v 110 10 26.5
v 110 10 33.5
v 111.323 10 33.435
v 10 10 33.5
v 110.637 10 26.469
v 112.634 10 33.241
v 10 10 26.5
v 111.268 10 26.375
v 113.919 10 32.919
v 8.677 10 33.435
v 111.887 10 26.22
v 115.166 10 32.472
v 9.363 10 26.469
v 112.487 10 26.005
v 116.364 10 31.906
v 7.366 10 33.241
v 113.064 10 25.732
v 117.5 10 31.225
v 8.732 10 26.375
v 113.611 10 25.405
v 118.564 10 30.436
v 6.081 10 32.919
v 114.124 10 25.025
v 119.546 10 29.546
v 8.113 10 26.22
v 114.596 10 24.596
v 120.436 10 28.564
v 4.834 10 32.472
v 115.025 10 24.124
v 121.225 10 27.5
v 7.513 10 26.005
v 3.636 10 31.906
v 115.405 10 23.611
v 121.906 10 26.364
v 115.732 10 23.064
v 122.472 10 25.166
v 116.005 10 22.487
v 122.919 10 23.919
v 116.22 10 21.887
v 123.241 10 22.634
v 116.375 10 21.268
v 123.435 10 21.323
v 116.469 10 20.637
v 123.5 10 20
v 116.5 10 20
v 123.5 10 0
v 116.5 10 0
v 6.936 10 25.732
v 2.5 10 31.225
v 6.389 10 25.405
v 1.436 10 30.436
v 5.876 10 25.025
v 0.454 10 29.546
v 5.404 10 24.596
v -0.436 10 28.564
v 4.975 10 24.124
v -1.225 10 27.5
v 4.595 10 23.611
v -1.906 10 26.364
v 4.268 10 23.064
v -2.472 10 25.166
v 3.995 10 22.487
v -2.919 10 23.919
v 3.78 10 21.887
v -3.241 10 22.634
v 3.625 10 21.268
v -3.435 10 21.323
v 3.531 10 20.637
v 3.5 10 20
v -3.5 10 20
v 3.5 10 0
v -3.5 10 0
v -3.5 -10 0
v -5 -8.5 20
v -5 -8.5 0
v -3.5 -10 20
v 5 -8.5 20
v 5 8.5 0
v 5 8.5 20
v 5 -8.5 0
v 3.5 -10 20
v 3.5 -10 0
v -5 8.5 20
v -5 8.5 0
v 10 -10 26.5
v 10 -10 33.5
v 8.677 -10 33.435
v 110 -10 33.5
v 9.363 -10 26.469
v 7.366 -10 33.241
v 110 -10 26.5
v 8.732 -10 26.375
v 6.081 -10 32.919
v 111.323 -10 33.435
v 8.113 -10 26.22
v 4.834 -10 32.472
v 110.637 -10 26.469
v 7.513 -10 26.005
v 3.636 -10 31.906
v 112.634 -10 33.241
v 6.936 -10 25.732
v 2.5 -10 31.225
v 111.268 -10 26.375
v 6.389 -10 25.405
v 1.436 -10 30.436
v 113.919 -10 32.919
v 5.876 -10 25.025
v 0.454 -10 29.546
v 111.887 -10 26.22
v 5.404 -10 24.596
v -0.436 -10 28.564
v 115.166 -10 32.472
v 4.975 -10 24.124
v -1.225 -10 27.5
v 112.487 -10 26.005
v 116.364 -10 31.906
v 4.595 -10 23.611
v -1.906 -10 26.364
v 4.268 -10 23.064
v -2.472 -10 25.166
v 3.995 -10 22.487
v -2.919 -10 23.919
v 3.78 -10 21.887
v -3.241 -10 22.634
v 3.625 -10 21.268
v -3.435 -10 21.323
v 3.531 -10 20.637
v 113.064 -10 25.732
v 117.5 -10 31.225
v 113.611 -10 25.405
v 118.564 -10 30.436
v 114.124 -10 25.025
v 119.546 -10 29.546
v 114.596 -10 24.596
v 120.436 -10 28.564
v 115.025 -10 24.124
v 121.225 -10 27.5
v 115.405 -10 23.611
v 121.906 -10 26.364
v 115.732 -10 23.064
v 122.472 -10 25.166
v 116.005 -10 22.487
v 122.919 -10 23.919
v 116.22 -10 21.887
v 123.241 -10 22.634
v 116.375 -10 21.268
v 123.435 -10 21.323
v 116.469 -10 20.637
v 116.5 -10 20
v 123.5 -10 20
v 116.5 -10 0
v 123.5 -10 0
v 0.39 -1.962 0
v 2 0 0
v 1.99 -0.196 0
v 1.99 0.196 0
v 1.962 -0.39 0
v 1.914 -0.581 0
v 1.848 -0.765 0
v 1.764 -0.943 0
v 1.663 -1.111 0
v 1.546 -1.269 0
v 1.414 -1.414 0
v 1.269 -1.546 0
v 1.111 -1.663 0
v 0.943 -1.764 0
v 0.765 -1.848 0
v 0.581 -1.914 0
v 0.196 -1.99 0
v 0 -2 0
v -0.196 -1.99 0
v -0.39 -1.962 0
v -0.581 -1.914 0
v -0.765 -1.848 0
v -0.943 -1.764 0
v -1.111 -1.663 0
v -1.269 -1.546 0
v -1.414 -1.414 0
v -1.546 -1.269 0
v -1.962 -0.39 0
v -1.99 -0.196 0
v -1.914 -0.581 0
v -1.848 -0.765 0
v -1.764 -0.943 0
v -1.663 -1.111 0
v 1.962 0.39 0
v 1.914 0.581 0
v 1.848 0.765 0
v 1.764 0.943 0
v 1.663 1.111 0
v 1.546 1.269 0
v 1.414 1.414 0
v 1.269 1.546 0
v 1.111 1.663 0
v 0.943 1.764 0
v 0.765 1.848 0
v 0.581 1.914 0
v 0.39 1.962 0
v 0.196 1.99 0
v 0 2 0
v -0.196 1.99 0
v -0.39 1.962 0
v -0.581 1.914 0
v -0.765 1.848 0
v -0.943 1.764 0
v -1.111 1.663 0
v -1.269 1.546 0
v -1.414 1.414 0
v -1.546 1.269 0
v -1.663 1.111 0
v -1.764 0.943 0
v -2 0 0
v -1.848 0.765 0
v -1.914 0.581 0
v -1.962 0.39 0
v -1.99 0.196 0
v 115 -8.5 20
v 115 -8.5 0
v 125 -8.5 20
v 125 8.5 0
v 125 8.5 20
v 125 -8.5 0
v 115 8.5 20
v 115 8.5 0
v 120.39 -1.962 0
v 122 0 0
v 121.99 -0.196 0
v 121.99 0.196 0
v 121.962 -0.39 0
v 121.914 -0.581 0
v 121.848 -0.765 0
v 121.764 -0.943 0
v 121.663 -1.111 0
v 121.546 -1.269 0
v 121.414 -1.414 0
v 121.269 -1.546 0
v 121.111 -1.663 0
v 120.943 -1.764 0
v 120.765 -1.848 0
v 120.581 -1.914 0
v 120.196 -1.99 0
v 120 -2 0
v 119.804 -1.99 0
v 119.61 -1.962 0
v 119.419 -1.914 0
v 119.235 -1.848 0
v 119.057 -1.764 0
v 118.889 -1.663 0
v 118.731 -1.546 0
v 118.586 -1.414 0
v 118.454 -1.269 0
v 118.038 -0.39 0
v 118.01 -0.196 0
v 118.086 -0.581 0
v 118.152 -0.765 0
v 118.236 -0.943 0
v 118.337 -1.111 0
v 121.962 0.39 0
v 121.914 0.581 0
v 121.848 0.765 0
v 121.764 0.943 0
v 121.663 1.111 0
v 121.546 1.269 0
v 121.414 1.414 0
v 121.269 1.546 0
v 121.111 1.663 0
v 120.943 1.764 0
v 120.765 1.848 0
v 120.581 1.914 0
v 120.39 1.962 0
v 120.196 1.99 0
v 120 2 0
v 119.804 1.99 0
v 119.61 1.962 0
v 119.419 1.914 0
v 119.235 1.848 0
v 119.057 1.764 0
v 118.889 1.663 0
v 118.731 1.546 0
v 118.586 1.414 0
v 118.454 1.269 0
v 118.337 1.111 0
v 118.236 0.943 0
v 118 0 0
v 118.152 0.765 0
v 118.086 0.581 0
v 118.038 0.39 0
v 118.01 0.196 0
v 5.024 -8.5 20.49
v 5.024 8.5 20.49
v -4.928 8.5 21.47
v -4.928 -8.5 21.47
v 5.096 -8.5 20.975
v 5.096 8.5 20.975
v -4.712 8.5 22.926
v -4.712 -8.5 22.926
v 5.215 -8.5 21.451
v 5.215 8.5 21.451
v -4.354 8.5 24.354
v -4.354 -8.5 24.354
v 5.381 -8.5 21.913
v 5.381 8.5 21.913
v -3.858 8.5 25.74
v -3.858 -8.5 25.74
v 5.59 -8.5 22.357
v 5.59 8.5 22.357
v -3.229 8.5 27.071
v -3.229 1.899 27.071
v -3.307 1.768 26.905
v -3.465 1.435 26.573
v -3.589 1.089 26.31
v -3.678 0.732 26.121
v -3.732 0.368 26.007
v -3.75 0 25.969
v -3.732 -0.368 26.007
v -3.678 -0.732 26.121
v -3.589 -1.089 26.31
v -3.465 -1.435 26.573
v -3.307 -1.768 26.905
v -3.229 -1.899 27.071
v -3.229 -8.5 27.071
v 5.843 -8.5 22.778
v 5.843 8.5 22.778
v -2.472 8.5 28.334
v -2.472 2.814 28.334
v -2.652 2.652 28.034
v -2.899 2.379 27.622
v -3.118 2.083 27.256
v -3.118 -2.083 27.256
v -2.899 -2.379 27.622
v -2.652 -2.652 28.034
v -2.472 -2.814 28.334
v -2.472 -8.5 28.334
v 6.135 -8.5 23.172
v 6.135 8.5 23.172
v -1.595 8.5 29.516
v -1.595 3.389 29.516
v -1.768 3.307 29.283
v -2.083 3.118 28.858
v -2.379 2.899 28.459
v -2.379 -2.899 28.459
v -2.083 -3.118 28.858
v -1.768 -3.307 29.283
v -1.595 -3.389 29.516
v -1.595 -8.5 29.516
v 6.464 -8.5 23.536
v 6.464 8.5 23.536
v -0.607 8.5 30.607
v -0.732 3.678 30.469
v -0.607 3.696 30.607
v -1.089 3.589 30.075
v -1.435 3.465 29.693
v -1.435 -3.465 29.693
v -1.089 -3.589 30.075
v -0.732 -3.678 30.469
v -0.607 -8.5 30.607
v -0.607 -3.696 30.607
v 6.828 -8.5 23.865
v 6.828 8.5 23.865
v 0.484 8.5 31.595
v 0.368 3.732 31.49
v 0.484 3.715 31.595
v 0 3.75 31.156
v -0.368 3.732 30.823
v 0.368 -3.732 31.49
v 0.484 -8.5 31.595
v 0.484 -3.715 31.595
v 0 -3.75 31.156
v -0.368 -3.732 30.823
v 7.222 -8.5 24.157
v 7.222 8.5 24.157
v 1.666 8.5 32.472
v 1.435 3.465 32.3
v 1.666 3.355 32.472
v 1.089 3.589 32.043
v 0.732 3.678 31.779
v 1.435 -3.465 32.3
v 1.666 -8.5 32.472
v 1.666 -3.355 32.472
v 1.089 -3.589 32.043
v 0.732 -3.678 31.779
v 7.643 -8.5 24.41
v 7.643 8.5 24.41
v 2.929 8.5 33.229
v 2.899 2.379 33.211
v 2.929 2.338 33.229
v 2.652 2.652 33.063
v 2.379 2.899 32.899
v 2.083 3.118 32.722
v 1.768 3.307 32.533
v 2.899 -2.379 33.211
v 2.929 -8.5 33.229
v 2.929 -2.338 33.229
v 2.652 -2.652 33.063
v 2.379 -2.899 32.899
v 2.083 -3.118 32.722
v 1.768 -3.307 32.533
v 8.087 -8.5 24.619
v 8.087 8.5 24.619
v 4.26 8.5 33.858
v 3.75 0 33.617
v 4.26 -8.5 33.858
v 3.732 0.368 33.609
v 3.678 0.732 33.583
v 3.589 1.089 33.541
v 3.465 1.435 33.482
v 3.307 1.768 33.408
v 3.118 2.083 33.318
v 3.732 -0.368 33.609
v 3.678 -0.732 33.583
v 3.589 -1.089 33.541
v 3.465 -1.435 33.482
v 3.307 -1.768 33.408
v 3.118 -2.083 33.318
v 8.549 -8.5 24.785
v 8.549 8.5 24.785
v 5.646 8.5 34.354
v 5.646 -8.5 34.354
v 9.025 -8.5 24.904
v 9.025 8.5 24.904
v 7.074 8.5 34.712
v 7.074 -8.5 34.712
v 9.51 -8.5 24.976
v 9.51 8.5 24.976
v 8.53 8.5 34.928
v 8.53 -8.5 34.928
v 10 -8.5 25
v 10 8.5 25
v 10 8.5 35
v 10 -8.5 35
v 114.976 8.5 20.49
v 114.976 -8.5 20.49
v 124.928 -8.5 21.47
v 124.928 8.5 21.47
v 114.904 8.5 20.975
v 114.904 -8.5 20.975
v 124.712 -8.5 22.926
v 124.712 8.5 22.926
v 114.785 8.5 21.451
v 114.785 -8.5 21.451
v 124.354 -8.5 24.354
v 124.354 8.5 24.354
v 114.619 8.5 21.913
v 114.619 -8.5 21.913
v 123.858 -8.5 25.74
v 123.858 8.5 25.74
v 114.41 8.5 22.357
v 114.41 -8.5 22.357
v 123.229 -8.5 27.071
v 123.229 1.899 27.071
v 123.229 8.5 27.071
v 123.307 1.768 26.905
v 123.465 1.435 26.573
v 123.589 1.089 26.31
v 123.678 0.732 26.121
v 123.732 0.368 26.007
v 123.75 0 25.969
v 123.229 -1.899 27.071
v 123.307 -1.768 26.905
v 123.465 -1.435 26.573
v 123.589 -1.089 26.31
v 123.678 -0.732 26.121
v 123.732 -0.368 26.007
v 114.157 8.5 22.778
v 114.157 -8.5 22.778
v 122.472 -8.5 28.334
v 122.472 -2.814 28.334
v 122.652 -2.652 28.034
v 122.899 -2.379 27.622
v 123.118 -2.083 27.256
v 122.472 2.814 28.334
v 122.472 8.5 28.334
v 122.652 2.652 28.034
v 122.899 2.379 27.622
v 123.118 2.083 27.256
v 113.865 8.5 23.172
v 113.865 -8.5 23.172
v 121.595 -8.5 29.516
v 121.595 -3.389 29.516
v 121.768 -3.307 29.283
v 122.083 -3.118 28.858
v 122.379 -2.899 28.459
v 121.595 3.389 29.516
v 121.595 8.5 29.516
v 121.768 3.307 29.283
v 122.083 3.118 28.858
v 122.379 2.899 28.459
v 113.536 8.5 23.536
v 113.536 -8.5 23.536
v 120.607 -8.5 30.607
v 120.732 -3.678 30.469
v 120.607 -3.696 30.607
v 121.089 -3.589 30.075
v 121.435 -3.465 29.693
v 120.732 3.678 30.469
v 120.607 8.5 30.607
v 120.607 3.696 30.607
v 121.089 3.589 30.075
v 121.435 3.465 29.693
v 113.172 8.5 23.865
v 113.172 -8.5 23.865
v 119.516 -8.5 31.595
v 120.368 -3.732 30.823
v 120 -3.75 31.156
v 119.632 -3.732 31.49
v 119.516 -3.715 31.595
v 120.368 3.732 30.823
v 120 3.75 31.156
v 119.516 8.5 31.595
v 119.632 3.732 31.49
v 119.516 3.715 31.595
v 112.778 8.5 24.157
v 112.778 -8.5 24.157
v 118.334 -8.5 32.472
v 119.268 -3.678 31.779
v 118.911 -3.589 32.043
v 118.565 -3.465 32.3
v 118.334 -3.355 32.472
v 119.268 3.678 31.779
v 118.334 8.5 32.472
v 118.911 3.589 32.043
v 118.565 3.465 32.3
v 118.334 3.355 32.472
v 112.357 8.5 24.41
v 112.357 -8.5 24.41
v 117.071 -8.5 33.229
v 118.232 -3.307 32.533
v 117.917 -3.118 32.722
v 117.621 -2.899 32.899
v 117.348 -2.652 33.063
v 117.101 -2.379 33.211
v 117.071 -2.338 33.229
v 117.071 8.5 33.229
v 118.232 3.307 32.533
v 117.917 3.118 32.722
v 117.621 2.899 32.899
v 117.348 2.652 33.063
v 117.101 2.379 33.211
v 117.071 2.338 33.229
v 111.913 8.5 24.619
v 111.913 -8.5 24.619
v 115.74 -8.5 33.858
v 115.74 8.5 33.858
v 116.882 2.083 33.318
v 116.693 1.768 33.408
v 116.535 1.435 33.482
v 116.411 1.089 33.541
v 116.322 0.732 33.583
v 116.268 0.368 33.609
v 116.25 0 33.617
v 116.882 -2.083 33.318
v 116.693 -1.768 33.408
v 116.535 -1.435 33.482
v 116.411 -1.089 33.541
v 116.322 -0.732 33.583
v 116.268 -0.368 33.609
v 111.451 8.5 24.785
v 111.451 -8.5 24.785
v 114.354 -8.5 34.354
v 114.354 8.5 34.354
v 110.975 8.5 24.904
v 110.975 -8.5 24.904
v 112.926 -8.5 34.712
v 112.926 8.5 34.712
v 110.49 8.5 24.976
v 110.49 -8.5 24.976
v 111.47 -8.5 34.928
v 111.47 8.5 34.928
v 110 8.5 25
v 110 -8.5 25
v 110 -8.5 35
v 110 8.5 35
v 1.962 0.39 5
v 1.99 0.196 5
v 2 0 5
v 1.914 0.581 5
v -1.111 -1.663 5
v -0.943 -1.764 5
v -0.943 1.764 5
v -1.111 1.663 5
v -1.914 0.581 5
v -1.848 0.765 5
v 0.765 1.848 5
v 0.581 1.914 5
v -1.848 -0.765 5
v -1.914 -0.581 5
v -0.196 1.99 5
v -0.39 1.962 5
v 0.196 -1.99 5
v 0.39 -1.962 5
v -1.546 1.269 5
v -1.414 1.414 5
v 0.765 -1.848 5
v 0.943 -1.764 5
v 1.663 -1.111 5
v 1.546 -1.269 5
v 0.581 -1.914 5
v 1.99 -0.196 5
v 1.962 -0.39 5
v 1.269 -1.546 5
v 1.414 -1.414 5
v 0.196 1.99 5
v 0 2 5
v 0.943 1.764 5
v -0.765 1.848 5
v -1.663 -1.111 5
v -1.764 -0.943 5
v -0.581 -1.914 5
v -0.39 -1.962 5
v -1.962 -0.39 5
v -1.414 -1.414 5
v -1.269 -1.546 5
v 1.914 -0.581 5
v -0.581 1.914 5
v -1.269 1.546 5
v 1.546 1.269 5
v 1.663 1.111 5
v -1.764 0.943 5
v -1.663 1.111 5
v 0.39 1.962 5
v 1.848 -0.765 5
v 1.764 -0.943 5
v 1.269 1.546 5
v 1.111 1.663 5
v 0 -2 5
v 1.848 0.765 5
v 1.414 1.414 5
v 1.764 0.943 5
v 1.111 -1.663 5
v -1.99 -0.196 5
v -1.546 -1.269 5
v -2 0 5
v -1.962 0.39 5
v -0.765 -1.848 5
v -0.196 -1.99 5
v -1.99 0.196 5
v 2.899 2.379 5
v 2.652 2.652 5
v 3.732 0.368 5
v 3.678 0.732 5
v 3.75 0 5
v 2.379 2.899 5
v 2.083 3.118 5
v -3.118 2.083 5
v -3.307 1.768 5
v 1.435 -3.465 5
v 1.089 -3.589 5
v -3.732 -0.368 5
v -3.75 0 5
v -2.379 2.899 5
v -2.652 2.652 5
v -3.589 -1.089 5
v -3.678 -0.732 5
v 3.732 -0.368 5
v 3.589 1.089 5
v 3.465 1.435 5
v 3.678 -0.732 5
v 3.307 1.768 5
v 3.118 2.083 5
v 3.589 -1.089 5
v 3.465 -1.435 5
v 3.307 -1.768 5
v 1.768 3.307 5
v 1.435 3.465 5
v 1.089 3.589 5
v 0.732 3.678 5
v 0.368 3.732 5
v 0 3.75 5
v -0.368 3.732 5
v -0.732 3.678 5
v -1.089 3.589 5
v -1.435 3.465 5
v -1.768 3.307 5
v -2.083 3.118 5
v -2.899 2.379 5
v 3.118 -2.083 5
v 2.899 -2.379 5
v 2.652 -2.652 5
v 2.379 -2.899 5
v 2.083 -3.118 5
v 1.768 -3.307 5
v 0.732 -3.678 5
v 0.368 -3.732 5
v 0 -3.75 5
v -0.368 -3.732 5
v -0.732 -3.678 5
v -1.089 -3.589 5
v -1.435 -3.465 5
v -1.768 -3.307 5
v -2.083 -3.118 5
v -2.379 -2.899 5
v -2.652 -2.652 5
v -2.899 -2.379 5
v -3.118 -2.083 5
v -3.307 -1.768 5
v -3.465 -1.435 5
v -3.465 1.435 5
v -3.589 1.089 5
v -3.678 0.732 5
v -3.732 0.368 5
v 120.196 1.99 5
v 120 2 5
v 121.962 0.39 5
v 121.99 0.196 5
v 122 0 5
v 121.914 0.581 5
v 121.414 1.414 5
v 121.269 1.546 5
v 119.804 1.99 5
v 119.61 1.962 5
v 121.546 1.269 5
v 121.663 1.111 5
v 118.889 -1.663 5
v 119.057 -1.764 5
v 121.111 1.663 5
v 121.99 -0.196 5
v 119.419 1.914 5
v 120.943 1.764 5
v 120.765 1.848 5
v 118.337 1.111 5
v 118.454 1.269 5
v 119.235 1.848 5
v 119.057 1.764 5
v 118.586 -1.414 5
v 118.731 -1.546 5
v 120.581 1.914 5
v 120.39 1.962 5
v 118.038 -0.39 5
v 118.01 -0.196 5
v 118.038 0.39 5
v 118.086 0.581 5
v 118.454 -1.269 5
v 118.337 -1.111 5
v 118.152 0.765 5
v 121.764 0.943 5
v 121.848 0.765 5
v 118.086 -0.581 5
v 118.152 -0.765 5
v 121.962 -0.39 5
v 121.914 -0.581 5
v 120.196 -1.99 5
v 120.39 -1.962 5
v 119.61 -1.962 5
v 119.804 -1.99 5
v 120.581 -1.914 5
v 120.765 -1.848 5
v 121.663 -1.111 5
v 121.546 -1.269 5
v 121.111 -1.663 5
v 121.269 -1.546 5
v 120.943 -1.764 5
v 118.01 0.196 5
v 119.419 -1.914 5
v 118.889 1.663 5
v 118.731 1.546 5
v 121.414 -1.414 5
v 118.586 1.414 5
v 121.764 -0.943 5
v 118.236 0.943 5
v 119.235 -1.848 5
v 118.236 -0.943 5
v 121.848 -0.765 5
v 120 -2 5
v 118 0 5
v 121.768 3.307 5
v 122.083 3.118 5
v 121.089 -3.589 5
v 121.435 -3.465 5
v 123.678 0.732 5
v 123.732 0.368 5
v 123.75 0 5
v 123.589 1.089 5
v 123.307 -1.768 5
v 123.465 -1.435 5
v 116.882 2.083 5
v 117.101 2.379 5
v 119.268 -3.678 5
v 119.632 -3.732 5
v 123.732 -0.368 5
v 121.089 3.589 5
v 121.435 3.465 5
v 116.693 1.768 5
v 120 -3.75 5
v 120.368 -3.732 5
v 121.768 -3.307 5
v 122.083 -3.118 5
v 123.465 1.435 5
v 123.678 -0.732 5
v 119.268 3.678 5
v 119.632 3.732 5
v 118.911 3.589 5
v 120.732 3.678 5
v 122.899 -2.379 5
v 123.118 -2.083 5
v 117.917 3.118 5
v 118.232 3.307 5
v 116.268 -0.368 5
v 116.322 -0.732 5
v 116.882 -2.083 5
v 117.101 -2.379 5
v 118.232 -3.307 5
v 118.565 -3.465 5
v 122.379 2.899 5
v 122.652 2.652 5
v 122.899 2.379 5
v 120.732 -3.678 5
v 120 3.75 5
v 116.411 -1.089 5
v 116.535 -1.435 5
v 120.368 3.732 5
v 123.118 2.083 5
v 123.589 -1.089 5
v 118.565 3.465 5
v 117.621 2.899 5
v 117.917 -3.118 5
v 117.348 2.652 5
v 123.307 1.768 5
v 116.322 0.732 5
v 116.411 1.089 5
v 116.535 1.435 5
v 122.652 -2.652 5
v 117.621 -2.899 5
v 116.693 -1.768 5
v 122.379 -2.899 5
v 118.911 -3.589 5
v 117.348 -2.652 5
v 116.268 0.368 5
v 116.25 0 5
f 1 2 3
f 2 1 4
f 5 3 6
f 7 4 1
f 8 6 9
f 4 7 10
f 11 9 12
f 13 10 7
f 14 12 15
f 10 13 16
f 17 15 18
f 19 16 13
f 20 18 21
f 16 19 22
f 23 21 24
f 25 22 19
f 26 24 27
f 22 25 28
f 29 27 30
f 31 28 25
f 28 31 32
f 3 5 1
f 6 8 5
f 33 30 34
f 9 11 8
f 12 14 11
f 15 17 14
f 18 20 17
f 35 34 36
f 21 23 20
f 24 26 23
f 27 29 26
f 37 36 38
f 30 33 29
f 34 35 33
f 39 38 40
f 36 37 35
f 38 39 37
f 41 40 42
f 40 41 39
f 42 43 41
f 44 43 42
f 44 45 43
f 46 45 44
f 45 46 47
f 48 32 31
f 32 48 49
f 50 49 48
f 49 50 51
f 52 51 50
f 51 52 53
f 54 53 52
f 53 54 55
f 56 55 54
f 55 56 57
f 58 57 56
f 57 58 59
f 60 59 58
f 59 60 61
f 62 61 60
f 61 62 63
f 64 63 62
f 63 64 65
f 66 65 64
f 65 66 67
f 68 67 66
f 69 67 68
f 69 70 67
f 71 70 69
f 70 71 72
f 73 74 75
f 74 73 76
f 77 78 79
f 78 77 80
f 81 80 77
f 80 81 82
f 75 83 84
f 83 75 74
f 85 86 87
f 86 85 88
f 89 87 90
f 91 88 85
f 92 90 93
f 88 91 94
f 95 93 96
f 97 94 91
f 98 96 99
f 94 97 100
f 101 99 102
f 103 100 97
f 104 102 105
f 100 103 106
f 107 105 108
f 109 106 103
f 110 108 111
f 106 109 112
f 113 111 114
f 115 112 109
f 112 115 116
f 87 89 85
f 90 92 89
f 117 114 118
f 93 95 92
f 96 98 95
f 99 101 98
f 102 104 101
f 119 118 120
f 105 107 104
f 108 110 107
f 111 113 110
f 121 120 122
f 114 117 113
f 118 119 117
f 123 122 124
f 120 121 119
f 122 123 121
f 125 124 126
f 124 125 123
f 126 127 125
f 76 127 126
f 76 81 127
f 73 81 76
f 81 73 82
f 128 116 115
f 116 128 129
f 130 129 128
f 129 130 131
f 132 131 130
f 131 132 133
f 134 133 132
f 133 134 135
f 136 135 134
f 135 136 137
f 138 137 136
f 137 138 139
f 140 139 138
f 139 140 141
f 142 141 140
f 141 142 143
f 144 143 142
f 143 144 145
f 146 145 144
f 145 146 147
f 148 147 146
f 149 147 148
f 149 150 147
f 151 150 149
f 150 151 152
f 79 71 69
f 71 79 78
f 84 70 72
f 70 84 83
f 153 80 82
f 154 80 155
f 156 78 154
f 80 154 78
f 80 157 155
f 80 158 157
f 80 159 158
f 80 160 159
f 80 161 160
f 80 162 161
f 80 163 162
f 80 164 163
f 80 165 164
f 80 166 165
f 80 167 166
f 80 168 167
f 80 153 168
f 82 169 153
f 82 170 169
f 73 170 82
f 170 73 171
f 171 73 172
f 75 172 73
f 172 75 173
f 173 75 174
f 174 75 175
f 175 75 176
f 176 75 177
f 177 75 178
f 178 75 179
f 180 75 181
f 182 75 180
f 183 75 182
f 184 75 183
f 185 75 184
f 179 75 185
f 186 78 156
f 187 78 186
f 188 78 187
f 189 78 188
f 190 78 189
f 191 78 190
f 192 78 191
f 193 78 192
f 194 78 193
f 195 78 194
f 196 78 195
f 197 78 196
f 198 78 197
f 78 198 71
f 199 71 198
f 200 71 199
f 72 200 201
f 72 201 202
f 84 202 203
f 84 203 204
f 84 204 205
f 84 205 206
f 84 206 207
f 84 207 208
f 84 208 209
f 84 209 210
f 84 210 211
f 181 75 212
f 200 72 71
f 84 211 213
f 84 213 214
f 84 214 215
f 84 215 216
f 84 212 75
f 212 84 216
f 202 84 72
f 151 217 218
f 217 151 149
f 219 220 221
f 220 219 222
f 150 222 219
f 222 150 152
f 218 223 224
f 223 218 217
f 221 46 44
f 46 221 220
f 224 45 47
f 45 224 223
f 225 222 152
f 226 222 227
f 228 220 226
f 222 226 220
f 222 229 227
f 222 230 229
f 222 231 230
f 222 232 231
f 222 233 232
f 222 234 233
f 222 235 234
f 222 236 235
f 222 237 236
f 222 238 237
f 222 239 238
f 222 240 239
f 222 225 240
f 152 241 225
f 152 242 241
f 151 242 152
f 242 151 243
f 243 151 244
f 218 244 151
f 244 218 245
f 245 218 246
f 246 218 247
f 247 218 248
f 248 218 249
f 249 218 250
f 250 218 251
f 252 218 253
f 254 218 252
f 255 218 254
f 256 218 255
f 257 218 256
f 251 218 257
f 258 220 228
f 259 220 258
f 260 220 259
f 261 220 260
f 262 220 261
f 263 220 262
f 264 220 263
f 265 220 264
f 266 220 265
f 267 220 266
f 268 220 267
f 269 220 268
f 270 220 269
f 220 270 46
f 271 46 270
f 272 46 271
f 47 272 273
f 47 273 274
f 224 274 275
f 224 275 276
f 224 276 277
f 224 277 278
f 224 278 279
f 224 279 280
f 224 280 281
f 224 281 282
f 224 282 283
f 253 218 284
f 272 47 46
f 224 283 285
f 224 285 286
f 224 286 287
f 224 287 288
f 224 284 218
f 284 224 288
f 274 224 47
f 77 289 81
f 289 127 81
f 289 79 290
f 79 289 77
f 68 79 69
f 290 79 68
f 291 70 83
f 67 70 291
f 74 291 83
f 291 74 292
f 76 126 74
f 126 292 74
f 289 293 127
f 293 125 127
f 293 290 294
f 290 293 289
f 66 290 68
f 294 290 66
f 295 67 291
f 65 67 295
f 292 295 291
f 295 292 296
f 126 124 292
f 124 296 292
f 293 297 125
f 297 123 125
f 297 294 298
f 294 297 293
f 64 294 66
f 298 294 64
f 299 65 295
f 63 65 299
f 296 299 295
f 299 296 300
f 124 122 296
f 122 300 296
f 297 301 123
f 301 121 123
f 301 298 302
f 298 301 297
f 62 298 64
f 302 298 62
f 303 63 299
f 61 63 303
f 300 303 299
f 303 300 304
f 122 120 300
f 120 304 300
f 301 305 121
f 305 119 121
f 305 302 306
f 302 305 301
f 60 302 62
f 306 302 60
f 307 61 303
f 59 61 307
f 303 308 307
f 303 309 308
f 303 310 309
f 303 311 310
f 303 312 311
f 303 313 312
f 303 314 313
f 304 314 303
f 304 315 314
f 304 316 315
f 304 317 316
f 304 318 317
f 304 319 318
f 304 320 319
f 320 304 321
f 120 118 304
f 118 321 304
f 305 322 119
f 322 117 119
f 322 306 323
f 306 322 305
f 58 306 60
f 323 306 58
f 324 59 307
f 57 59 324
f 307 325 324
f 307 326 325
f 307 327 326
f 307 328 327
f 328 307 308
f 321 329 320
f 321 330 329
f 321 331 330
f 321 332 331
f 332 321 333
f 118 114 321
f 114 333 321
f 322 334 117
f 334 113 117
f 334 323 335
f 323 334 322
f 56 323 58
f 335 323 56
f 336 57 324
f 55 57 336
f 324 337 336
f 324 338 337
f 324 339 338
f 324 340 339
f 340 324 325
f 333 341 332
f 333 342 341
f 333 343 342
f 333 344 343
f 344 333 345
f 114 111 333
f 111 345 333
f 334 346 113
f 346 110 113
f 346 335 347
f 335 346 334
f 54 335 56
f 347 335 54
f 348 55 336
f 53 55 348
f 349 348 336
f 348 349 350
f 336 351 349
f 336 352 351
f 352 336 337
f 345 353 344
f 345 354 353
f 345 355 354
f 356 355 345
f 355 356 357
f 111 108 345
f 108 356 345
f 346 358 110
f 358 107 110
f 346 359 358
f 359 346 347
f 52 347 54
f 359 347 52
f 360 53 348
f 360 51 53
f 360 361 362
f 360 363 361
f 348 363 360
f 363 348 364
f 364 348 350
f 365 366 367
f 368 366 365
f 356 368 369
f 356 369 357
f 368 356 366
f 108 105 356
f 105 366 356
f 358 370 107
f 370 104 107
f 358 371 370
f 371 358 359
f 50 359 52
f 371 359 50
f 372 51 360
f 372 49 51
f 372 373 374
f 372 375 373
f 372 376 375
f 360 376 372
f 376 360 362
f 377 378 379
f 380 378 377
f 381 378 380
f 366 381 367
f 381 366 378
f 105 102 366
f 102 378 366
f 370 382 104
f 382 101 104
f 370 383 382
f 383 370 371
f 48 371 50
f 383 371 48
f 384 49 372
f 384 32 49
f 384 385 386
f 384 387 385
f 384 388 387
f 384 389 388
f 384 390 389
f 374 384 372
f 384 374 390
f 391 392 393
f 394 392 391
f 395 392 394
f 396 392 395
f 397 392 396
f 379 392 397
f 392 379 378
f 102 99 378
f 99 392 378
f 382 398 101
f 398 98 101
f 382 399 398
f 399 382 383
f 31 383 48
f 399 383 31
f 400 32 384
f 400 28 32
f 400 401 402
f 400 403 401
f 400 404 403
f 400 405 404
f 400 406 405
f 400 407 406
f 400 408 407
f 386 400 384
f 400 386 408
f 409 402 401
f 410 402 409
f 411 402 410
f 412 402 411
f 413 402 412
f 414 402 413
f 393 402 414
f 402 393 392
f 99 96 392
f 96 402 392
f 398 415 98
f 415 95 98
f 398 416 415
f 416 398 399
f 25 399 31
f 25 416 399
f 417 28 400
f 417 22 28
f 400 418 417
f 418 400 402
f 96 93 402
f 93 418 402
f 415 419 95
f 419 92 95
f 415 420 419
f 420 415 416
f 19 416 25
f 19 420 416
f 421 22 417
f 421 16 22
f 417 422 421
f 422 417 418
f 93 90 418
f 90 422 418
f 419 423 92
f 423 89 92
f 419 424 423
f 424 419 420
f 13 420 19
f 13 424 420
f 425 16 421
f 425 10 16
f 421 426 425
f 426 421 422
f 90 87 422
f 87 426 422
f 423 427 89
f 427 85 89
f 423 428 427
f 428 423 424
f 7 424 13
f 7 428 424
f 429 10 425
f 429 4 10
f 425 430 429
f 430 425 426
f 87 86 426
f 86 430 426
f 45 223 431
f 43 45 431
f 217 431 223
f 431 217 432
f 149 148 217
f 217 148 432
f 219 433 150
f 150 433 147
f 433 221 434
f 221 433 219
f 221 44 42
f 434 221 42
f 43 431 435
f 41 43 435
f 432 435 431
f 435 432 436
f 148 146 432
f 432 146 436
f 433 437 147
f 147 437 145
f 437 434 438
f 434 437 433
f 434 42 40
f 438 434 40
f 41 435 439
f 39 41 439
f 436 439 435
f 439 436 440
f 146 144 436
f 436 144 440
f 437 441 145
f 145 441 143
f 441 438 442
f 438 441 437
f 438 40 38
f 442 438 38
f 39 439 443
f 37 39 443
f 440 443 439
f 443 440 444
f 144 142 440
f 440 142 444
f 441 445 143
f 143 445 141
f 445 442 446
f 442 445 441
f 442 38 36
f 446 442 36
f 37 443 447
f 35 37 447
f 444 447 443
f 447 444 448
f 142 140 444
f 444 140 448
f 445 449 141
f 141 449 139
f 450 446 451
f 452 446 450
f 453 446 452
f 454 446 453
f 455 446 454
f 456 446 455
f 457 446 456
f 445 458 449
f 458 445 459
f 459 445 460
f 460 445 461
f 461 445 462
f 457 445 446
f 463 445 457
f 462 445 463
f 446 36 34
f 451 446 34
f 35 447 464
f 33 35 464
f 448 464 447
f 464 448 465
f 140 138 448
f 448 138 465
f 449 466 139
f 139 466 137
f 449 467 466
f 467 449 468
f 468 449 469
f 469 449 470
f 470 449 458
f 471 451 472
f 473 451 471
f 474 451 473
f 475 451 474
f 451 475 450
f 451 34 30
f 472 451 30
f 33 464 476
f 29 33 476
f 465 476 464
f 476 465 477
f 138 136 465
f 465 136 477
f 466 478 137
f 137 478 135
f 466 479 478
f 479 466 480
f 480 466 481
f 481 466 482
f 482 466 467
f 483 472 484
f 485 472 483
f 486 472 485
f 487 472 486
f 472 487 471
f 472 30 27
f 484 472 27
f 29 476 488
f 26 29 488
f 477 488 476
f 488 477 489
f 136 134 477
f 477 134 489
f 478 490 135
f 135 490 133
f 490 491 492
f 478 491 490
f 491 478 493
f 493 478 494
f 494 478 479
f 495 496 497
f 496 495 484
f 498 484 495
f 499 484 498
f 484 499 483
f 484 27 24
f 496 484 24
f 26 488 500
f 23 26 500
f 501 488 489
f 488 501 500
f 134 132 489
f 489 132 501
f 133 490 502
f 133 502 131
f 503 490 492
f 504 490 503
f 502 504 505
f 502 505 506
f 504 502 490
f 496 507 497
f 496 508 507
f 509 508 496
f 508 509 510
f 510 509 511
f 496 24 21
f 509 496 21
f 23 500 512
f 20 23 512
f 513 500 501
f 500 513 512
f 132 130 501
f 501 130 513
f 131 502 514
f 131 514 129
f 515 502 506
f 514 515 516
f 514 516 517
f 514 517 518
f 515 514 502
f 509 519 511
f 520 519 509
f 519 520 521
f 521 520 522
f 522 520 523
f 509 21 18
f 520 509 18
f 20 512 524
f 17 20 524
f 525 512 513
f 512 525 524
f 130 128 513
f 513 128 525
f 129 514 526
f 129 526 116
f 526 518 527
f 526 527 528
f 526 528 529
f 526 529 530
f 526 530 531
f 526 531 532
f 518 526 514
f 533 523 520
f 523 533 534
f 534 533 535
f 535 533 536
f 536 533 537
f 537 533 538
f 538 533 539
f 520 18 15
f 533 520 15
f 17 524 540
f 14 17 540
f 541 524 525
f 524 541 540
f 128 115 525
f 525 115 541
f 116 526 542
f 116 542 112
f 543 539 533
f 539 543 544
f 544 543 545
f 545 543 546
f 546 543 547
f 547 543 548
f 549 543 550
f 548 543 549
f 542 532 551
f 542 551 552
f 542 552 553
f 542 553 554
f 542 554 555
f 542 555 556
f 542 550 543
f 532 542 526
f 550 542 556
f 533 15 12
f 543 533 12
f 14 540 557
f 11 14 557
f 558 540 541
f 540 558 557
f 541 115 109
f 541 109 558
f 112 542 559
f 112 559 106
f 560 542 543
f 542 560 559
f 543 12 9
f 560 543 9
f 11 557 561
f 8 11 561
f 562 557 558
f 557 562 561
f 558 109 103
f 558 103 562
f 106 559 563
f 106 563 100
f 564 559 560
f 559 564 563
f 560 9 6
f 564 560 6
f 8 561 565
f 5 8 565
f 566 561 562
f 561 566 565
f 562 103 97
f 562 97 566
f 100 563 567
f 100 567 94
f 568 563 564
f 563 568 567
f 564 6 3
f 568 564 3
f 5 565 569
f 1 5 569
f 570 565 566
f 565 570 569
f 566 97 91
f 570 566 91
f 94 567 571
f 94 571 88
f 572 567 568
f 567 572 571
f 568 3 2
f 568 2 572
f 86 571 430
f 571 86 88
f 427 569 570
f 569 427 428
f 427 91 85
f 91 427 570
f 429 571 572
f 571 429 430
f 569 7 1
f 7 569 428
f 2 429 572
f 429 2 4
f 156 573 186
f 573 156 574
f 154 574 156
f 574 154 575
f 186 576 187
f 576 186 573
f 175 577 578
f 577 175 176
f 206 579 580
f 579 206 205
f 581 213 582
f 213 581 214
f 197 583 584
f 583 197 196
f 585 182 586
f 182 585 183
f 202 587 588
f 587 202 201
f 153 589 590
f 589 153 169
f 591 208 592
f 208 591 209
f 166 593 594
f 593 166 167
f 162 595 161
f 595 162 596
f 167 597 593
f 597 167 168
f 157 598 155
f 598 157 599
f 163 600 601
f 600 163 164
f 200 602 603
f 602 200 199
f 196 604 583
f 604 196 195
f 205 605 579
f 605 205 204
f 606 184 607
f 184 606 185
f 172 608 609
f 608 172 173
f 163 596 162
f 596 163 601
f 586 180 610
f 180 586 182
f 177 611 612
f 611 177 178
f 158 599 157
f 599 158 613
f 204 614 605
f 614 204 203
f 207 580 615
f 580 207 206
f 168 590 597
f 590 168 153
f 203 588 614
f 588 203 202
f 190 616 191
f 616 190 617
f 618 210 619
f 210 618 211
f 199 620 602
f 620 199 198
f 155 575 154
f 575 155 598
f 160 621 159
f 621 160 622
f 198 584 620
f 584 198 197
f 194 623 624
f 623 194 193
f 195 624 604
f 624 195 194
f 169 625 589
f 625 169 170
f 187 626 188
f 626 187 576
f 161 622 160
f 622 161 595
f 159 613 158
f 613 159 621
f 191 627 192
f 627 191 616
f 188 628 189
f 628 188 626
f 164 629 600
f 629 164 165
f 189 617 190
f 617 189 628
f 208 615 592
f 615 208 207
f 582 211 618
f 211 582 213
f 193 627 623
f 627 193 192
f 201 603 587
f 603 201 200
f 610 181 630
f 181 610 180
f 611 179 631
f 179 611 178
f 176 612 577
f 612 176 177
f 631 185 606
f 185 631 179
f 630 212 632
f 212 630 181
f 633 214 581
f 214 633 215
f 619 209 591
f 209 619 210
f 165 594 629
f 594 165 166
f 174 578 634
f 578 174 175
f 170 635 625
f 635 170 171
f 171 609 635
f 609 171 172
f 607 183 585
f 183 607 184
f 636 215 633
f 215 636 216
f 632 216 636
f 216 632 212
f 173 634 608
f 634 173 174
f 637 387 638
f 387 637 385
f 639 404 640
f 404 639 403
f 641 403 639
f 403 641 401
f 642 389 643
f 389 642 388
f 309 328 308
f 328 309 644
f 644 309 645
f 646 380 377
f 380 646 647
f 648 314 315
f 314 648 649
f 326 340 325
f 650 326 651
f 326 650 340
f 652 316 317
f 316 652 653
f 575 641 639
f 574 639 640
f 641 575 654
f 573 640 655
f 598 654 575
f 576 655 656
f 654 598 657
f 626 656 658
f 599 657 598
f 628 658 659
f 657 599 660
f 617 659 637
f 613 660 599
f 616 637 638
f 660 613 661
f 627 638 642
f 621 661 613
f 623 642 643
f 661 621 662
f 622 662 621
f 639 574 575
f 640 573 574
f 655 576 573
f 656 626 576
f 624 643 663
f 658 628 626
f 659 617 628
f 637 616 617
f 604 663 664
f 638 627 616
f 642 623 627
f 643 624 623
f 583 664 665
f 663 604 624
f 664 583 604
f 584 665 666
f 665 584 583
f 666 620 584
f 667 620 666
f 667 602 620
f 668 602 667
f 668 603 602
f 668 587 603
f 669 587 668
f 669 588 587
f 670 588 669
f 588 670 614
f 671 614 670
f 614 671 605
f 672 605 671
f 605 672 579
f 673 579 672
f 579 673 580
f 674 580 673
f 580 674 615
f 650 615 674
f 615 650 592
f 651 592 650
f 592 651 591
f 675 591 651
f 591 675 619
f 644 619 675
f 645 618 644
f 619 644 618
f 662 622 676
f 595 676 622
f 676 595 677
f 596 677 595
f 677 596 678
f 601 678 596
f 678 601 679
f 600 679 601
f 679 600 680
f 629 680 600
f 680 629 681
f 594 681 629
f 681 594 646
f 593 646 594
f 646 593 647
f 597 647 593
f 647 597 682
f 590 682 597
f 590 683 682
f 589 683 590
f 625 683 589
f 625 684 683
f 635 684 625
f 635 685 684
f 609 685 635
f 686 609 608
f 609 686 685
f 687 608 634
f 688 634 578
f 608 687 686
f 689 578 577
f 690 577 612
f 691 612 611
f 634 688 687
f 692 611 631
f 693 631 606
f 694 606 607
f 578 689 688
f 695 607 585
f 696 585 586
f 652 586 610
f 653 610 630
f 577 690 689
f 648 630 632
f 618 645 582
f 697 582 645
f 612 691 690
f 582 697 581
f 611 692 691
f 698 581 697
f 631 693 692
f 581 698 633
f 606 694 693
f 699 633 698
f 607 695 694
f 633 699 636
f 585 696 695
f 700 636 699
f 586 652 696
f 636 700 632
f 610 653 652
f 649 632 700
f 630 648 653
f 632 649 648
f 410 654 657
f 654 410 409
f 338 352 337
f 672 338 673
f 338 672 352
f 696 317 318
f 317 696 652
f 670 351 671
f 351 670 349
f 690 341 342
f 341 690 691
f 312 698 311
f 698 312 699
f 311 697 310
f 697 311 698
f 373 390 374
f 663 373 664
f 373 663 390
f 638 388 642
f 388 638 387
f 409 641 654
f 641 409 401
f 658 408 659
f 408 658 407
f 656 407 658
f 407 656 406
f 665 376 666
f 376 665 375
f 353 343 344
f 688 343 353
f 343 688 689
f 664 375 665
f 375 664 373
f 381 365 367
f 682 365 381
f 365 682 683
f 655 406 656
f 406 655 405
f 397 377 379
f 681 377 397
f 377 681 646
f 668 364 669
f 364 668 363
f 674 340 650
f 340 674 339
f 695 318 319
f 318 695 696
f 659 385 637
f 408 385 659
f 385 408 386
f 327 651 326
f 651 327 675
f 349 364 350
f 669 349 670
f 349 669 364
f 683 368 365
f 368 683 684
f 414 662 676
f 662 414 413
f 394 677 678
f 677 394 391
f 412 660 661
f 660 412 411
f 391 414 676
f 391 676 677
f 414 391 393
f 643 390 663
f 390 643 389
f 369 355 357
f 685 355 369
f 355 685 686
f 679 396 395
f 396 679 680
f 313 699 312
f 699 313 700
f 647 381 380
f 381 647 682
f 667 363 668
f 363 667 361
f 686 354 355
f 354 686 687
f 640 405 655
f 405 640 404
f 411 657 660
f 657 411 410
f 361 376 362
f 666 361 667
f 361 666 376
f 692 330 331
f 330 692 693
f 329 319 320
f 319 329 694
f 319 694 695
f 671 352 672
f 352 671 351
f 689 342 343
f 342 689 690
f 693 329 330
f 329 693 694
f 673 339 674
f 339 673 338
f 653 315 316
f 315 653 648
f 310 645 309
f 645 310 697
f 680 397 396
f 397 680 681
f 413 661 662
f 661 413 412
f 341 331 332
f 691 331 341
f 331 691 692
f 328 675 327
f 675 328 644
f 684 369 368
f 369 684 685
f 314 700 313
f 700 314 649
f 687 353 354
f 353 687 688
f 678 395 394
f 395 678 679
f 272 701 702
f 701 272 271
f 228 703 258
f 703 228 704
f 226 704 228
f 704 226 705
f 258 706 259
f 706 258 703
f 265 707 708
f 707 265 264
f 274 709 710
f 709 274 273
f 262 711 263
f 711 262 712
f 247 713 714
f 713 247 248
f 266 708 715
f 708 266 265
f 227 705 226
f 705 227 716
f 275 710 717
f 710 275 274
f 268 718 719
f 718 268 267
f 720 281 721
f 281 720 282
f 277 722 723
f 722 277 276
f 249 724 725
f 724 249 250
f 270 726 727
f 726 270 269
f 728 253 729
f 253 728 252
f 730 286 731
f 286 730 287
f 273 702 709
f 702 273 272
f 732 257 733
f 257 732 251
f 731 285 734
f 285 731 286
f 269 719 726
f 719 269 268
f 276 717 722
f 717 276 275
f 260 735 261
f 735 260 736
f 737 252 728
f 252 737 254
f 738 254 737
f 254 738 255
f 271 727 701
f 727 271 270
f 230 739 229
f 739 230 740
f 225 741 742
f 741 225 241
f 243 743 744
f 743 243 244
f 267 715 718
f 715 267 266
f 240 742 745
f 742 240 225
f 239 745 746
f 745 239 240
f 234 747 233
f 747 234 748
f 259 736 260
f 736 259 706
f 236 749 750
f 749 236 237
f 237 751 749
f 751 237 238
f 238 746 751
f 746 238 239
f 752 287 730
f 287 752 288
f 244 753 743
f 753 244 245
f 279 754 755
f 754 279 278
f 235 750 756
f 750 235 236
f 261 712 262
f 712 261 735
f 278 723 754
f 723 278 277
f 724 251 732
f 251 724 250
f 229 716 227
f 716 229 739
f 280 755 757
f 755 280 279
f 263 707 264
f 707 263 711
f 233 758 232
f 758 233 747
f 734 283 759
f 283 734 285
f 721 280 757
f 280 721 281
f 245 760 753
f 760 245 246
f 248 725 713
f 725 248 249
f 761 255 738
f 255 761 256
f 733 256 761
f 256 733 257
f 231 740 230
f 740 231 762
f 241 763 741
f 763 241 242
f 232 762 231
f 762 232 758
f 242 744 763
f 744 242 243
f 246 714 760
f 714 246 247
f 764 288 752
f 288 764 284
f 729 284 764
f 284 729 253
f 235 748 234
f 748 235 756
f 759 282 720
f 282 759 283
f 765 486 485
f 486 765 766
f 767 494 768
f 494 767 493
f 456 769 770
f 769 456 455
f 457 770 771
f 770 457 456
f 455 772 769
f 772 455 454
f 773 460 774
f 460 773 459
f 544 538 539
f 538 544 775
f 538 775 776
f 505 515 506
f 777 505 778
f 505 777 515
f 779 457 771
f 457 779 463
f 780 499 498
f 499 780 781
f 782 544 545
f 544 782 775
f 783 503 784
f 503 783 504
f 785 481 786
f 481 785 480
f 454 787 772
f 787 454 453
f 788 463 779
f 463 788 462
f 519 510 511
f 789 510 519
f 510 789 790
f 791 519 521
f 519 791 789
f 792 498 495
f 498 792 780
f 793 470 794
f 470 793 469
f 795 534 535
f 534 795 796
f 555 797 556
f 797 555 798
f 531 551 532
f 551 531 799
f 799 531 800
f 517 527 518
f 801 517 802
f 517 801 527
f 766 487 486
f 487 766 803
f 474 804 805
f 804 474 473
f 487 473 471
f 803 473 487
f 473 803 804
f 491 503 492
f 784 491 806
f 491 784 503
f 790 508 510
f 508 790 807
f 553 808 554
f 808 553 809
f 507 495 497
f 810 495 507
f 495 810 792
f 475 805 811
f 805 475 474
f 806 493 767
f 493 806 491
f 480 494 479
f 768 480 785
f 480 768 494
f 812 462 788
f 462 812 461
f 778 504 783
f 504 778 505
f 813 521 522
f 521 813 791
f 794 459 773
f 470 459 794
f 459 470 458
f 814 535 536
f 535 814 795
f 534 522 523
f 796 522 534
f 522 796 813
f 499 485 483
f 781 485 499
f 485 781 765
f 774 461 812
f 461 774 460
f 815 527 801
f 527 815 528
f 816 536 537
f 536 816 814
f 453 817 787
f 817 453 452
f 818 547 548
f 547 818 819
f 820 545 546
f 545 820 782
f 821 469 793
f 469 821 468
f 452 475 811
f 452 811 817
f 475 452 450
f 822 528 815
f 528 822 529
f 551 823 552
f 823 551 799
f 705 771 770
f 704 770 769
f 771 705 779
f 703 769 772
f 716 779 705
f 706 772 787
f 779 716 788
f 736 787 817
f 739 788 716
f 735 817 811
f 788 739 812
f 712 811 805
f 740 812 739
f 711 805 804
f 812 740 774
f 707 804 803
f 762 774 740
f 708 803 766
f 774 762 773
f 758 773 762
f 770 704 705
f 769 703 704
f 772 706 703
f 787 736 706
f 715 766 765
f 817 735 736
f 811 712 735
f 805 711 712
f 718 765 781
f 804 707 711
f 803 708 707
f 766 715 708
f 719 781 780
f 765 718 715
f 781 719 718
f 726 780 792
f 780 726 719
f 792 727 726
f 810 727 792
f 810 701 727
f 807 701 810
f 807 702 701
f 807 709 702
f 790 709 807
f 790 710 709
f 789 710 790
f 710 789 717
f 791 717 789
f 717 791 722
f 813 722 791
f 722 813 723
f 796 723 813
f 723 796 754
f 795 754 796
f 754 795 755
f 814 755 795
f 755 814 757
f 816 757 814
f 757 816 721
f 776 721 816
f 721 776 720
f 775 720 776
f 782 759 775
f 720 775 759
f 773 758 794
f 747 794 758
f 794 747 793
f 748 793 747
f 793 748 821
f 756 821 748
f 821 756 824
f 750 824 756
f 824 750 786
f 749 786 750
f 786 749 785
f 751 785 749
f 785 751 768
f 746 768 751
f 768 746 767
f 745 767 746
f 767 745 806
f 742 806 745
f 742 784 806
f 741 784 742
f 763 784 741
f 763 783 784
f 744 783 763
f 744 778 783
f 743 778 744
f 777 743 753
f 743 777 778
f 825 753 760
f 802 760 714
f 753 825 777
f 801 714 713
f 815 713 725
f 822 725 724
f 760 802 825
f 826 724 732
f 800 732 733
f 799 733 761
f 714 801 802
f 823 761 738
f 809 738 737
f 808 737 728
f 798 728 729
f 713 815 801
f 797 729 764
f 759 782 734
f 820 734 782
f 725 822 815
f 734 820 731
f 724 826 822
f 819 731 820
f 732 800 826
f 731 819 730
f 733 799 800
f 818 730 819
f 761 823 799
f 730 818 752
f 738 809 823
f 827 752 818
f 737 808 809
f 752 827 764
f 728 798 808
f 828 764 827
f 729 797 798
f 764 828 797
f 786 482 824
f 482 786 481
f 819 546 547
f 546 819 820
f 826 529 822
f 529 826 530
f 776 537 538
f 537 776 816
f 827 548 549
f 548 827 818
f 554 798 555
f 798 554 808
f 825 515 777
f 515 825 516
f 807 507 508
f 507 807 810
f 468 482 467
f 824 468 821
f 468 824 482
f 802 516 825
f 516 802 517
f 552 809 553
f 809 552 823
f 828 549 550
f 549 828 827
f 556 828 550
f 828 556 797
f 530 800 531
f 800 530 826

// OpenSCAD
/* [Parameters] */

// Determines the distance between the two screw holes.
Length = 120;

// Determines the size of the 45-degree chamfer on the edges.
Chamfer_size = 1.5; 

// Determines the passthrough hole diameter for the two screws.
Skrew_diameter = 4;

// Determines the diameter of the hole for the screw head to recess into.
Skrew_head_diameter = 7.5;

// Determines handle width
Width = 20;

// Determines handle height / finger clearance.
Finger_clearance = 25;

// Determines thickness of handle.
Thickness = 10;

/* [Hidden] */
$fn = 64; // Smoothness resolution for curves

// --- 2D Cross Section Profile ---
// This generates a 2D rectangle with 45-degree chamfered corners
module chamfered_profile(t, w, c) {
    polygon([
        [-t/2, -w/2 + c],
        [-t/2 + c, -w/2],
        [t/2 - c, -w/2],
        [t/2, -w/2 + c],
        [t/2, w/2 - c],
        [t/2 - c, w/2],
        [-t/2 + c, w/2],
        [-t/2, w/2 - c]
    ]);
}

module Parametric_Handle() {
    
    // Auto-calculate bend alignments
    Bend_Radius = Thickness; 
    C_Z = Finger_clearance - (Thickness / 2); 

    // We generate the model standing up on its legs
    difference() {
        
        // --- 1. Main Solid Body ---
        union() {
            // A. Left Leg (Extruded straight up)
            translate([0, 0, 0])
                linear_extrude(height = C_Z)
                    chamfered_profile(Thickness, Width, Chamfer_size);

            // B. Right Leg (Extruded straight up)
            translate([Length, 0, 0])
                linear_extrude(height = C_Z)
                    chamfered_profile(Thickness, Width, Chamfer_size);

            // C. Left Top Corner (Rotated and swept 90 degrees)
            translate([Bend_Radius, 0, C_Z])
                rotate([90, 0, 180])
                    rotate_extrude(angle = 90)
                        translate([Bend_Radius, 0, 0])
                            chamfered_profile(Thickness, Width, Chamfer_size);

            // D. Right Top Corner (Rotated and swept 90 degrees)
            translate([Length - Bend_Radius, 0, C_Z])
                rotate([90, 0, 0])
                    rotate_extrude(angle = 90)
                        translate([Bend_Radius, 0, 0])
                            chamfered_profile(Thickness, Width, Chamfer_size);

            // E. Top Horizontal Bar
            translate([Bend_Radius, 0, C_Z + Bend_Radius])
                rotate([0, 90, 0])
                    linear_extrude(height = Length - 2 * Bend_Radius)
                        chamfered_profile(Thickness, Width, Chamfer_size);
        }

        // --- 2. Screw Holes ---
        // Left leg holes
        // Small passthrough hole
        translate([0, 0, -1])
            cylinder(d = Skrew_diameter, h = Finger_clearance + Bend_Radius + 2);
        // Larger counterbore for the screw head to sit inside
        translate([0, 0, Thickness / 2])
            cylinder(d = Skrew_head_diameter, h = Finger_clearance + Bend_Radius + 2);

        // Right leg holes
        // Small passthrough hole
        translate([Length, 0, -1])
            cylinder(d = Skrew_diameter, h = Finger_clearance + Bend_Radius + 2);
        // Larger counterbore for the screw head to sit inside
        translate([Length, 0, Thickness / 2])
            cylinder(d = Skrew_head_diameter, h = Finger_clearance + Bend_Radius + 2);
    }
}

// Generate the model
Parametric_Handle();
